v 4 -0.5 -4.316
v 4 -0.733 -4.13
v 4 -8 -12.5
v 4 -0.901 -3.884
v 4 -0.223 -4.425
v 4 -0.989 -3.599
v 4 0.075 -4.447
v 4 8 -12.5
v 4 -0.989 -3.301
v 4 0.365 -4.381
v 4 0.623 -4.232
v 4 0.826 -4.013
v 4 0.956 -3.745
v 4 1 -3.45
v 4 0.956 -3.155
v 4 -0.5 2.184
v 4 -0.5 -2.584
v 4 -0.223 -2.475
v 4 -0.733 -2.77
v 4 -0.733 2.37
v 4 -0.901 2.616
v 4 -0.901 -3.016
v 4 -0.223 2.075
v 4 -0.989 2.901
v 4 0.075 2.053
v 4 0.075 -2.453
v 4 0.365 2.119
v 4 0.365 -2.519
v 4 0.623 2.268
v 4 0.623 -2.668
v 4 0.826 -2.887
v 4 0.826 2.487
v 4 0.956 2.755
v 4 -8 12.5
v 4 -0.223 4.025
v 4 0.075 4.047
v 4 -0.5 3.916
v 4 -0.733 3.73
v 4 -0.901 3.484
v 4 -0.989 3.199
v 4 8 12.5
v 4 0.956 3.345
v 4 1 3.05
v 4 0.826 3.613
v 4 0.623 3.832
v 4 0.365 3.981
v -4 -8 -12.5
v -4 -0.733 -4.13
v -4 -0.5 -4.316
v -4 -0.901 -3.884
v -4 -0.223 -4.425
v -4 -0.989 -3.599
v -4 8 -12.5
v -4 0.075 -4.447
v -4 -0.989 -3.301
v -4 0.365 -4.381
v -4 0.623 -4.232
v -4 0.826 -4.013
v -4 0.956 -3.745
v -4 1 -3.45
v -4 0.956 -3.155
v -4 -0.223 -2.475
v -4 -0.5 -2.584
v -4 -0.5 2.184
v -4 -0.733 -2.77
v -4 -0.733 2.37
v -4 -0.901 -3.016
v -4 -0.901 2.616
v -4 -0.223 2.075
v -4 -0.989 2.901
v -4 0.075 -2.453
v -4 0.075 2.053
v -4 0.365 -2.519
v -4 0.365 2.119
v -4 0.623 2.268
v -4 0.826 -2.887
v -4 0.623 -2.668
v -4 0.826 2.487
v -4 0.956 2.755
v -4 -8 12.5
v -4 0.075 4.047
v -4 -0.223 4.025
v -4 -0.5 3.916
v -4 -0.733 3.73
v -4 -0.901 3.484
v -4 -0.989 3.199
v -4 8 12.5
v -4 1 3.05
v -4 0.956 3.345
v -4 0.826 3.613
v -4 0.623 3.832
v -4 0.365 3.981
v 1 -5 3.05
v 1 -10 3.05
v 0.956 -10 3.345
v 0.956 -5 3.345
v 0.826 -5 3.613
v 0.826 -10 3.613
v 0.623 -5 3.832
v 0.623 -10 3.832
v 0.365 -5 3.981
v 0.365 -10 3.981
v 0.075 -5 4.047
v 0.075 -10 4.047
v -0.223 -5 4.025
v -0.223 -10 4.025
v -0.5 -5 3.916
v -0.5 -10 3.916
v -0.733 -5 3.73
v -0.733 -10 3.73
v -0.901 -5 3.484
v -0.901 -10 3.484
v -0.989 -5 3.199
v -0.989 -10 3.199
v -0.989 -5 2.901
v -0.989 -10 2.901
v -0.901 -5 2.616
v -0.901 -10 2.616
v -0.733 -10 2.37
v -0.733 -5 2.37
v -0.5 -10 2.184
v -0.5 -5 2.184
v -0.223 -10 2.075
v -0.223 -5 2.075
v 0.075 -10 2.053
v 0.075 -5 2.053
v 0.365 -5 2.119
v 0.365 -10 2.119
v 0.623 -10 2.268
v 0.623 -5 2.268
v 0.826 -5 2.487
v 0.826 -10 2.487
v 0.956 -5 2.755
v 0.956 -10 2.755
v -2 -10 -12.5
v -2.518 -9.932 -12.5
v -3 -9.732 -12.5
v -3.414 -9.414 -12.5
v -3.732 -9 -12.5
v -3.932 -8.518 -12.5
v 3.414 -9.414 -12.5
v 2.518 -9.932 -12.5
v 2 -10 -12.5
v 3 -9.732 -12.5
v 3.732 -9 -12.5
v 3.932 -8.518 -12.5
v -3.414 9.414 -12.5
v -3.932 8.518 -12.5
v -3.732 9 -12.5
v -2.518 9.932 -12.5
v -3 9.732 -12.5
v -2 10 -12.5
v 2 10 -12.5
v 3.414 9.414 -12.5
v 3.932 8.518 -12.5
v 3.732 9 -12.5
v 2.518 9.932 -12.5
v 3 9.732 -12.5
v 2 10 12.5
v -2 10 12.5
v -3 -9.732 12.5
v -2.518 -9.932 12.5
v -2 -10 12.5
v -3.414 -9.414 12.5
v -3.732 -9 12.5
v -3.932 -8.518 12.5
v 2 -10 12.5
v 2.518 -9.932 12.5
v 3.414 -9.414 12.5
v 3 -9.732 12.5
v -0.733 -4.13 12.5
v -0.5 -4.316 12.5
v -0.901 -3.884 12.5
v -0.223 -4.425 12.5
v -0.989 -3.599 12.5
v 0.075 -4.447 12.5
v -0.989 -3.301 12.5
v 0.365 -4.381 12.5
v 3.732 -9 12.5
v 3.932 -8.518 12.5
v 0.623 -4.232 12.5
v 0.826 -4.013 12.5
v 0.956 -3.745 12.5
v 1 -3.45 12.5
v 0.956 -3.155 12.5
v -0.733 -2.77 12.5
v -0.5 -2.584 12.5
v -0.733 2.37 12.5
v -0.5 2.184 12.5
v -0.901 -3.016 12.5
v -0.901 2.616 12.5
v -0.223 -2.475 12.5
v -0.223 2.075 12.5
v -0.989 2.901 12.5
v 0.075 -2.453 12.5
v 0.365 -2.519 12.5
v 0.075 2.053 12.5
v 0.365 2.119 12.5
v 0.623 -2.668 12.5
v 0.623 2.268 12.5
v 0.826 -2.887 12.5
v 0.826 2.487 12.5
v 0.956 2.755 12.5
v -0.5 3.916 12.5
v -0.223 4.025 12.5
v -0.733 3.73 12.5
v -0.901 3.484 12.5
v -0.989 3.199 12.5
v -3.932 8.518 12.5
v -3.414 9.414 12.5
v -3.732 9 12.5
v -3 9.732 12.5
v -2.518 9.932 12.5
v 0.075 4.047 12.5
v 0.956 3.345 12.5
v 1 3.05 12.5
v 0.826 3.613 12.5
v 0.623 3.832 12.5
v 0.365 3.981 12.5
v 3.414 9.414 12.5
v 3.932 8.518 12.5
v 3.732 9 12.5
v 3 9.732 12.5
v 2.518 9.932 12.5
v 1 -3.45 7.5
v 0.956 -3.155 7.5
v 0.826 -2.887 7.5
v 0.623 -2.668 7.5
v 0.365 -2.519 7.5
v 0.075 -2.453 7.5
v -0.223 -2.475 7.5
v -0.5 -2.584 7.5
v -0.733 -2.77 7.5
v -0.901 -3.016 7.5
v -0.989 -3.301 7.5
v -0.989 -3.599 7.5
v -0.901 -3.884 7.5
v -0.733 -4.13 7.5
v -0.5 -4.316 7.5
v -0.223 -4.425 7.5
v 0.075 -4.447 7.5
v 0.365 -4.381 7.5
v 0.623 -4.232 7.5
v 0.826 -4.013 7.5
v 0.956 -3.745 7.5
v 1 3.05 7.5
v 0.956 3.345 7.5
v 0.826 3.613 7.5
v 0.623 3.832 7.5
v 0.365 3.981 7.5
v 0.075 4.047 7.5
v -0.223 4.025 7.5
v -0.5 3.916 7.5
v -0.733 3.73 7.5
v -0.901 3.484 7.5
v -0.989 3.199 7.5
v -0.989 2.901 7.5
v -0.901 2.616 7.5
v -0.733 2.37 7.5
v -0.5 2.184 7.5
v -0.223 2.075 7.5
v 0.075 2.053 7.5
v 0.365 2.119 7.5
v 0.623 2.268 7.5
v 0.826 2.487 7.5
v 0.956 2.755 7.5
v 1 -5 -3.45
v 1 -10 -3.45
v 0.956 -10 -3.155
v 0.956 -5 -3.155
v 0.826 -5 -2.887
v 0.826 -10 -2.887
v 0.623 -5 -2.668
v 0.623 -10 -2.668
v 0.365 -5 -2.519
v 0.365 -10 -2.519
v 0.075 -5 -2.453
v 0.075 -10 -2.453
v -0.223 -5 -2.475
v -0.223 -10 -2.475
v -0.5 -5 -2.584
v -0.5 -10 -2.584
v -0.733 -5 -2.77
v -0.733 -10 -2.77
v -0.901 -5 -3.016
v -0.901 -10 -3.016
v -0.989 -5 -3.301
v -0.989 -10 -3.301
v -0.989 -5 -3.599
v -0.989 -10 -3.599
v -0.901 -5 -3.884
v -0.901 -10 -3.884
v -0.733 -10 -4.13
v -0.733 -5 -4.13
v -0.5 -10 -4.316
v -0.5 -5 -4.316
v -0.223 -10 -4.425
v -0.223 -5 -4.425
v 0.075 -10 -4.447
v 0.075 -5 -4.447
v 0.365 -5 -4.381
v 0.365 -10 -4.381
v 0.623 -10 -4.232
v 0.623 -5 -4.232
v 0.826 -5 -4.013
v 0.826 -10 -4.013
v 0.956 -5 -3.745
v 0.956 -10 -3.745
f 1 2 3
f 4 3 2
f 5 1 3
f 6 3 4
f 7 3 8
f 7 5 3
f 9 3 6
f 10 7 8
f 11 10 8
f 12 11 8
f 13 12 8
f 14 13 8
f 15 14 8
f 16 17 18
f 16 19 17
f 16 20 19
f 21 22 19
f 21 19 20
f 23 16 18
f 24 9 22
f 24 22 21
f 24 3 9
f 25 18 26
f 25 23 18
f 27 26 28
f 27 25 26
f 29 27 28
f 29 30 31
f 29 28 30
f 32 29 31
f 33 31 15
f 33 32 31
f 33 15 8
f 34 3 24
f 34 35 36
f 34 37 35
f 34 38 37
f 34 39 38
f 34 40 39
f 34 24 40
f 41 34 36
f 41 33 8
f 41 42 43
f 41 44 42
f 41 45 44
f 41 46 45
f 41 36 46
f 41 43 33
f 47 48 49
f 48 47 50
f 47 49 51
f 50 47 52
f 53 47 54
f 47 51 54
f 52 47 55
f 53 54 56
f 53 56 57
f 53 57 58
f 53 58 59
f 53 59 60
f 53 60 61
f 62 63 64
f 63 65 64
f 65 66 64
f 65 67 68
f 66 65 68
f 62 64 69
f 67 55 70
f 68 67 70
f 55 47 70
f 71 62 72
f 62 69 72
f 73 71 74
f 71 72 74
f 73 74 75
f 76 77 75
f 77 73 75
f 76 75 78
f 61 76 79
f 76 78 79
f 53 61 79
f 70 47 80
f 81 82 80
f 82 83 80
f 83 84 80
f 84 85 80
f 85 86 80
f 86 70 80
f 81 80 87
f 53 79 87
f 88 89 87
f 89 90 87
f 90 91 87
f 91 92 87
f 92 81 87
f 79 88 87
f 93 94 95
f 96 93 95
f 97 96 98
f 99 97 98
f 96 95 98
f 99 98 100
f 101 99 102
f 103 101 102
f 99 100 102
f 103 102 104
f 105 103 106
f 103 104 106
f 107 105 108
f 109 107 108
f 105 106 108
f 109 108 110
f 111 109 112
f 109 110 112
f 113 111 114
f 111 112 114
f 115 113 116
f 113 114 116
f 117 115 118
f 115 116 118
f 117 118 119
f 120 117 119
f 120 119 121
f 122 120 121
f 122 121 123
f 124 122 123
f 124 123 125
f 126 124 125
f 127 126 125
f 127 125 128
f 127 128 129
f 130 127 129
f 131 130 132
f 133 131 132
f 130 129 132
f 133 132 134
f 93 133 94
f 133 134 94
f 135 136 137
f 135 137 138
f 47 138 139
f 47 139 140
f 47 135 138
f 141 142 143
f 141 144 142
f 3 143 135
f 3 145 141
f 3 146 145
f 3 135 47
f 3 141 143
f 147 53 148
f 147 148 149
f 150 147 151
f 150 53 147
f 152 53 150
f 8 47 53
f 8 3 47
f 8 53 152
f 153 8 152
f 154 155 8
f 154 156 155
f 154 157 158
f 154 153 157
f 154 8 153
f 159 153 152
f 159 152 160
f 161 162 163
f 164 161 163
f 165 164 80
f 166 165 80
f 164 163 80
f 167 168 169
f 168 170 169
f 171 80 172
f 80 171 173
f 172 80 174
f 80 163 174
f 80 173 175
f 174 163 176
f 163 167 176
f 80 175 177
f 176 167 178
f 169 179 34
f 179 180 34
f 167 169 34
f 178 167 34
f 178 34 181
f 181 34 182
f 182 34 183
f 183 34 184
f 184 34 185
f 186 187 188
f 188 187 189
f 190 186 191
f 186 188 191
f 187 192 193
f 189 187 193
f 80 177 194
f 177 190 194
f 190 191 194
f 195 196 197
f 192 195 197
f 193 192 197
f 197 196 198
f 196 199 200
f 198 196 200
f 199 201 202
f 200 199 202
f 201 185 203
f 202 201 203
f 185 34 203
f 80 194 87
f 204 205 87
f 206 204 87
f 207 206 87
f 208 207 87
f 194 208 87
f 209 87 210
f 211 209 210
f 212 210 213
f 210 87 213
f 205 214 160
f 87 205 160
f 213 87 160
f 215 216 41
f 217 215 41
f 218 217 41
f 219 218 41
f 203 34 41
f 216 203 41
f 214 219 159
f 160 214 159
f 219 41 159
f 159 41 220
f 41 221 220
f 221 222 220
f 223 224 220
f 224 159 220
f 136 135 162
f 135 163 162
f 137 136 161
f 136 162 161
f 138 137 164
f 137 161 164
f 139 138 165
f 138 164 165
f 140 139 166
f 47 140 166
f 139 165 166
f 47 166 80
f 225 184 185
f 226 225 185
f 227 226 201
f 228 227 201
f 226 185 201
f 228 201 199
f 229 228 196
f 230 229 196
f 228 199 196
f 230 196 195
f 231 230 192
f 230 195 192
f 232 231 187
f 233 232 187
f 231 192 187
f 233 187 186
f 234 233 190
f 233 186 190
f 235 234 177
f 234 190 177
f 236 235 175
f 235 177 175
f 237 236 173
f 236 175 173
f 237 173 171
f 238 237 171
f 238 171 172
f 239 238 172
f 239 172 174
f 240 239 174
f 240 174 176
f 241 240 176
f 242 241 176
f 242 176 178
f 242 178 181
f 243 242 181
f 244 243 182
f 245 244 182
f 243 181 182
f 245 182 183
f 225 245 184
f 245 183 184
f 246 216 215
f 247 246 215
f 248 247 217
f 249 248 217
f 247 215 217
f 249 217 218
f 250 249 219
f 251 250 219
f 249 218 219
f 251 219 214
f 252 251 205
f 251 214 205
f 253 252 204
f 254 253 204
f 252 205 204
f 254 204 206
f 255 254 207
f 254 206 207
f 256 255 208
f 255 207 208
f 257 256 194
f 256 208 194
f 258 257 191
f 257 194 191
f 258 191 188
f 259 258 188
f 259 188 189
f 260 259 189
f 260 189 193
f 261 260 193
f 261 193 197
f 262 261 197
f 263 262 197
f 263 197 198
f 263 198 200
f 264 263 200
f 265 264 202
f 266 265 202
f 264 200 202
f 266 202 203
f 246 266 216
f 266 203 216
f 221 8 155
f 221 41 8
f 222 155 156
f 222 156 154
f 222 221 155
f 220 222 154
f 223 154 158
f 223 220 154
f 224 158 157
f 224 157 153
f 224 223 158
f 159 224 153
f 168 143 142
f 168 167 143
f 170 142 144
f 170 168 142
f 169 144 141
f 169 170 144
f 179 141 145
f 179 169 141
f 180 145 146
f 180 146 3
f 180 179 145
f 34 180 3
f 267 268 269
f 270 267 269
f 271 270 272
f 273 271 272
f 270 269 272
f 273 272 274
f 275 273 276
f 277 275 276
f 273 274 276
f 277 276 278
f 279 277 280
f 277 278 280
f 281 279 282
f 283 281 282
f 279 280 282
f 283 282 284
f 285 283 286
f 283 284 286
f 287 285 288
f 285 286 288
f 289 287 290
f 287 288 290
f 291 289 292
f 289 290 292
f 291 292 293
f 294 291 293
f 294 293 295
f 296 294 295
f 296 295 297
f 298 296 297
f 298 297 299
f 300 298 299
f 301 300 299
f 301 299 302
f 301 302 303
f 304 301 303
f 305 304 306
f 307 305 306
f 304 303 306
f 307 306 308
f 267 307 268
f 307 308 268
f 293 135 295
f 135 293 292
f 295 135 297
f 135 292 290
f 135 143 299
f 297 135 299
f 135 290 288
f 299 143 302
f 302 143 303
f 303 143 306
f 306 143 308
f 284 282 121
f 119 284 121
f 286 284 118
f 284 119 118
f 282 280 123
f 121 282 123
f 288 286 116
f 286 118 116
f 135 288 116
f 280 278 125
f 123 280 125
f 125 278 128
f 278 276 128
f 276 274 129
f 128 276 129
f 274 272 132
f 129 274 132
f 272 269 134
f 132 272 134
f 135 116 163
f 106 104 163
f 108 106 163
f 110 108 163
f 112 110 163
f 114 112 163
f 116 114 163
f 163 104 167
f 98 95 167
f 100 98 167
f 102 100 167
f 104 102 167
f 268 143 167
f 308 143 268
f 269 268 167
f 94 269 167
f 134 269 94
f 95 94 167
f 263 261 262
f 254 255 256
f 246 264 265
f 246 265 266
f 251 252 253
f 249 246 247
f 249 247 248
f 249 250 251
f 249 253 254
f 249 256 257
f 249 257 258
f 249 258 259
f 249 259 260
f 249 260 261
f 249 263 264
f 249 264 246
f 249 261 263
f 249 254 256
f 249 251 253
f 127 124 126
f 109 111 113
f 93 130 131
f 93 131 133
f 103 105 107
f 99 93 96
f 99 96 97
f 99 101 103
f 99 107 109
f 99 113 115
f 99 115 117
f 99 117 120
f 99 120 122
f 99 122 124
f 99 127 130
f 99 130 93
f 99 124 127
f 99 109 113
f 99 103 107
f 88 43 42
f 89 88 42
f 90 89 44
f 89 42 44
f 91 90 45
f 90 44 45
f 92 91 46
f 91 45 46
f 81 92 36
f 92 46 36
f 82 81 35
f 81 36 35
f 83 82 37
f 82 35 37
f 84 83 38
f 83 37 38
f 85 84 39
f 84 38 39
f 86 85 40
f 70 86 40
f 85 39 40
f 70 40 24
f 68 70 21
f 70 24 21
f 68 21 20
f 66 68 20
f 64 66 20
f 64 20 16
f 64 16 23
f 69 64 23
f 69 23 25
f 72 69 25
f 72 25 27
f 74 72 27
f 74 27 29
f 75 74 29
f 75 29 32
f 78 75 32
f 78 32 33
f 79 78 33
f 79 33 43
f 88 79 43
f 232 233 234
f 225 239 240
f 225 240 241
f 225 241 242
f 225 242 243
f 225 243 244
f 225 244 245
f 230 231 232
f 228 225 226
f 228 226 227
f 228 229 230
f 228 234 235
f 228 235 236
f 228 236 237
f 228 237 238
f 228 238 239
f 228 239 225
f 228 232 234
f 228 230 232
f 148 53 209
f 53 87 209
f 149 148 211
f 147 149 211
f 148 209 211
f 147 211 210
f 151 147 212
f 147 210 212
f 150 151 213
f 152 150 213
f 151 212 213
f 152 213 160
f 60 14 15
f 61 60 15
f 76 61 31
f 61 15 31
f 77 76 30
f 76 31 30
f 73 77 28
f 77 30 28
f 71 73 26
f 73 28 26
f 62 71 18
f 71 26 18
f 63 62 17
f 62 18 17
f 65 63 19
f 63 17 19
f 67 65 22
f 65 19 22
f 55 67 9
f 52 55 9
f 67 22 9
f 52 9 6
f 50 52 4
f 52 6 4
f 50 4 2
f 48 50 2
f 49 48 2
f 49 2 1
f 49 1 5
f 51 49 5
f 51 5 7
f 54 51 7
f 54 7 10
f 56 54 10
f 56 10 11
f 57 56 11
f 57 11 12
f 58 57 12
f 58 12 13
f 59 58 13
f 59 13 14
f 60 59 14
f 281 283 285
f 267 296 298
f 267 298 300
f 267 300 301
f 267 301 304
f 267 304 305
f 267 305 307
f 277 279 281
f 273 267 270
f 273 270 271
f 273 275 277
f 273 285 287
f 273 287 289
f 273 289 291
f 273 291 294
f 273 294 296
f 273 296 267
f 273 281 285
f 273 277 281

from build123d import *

# Parameters (mm, degrees)
F0_W     = 20
F0_H     = 25
F1_DEPTH = 4
F2_R     = 1
F5_DEPTH = 25
F3_R     = 1
F6_DEPTH = 5
F4_R     = 1
F7_DEPTH = 5
F8_R     = 2


with BuildPart() as f1:
    # F0 (on Right) → F1 (new body, symmetric)
    with BuildSketch(Plane.YZ):
        Rectangle(F0_W, F0_H)
    extrude(amount=F1_DEPTH, both=True)

    # F2 (on face) → F5 (cut)
    with BuildSketch(Plane.YZ.offset(4)):
        with Locations((0, 3.05)):
            Circle(F2_R)
        with Locations((0, -3.45)):
            Circle(F2_R)
    extrude(amount=-F5_DEPTH, mode=Mode.SUBTRACT)

    # F3 (on face) → F6 (cut)
    with BuildSketch(Plane.XY.offset(12.5)):
        with Locations((0, -3.45)):
            Circle(F3_R)
        with Locations((0, 3.05)):
            Circle(F3_R)
    extrude(amount=-F6_DEPTH, mode=Mode.SUBTRACT)

    # F4 (on face) → F7 (cut)
    with BuildSketch(Plane.XZ.offset(10)):
        with Locations((0, 3.05)):
            Circle(F4_R)
        with Locations((0, -3.45)):
            Circle(F4_R)
    extrude(amount=-F7_DEPTH, mode=Mode.SUBTRACT)

    # F8
    f8_edges = [f1.edges().sort_by_distance(p)[0] for p in [
        (4, -10, 0),
        (-4, -10, 0),
        (4, 10, 0),
        (-4, 10, 0),
    ]]
    fillet(f8_edges, radius=F8_R)


solid = f1.part
